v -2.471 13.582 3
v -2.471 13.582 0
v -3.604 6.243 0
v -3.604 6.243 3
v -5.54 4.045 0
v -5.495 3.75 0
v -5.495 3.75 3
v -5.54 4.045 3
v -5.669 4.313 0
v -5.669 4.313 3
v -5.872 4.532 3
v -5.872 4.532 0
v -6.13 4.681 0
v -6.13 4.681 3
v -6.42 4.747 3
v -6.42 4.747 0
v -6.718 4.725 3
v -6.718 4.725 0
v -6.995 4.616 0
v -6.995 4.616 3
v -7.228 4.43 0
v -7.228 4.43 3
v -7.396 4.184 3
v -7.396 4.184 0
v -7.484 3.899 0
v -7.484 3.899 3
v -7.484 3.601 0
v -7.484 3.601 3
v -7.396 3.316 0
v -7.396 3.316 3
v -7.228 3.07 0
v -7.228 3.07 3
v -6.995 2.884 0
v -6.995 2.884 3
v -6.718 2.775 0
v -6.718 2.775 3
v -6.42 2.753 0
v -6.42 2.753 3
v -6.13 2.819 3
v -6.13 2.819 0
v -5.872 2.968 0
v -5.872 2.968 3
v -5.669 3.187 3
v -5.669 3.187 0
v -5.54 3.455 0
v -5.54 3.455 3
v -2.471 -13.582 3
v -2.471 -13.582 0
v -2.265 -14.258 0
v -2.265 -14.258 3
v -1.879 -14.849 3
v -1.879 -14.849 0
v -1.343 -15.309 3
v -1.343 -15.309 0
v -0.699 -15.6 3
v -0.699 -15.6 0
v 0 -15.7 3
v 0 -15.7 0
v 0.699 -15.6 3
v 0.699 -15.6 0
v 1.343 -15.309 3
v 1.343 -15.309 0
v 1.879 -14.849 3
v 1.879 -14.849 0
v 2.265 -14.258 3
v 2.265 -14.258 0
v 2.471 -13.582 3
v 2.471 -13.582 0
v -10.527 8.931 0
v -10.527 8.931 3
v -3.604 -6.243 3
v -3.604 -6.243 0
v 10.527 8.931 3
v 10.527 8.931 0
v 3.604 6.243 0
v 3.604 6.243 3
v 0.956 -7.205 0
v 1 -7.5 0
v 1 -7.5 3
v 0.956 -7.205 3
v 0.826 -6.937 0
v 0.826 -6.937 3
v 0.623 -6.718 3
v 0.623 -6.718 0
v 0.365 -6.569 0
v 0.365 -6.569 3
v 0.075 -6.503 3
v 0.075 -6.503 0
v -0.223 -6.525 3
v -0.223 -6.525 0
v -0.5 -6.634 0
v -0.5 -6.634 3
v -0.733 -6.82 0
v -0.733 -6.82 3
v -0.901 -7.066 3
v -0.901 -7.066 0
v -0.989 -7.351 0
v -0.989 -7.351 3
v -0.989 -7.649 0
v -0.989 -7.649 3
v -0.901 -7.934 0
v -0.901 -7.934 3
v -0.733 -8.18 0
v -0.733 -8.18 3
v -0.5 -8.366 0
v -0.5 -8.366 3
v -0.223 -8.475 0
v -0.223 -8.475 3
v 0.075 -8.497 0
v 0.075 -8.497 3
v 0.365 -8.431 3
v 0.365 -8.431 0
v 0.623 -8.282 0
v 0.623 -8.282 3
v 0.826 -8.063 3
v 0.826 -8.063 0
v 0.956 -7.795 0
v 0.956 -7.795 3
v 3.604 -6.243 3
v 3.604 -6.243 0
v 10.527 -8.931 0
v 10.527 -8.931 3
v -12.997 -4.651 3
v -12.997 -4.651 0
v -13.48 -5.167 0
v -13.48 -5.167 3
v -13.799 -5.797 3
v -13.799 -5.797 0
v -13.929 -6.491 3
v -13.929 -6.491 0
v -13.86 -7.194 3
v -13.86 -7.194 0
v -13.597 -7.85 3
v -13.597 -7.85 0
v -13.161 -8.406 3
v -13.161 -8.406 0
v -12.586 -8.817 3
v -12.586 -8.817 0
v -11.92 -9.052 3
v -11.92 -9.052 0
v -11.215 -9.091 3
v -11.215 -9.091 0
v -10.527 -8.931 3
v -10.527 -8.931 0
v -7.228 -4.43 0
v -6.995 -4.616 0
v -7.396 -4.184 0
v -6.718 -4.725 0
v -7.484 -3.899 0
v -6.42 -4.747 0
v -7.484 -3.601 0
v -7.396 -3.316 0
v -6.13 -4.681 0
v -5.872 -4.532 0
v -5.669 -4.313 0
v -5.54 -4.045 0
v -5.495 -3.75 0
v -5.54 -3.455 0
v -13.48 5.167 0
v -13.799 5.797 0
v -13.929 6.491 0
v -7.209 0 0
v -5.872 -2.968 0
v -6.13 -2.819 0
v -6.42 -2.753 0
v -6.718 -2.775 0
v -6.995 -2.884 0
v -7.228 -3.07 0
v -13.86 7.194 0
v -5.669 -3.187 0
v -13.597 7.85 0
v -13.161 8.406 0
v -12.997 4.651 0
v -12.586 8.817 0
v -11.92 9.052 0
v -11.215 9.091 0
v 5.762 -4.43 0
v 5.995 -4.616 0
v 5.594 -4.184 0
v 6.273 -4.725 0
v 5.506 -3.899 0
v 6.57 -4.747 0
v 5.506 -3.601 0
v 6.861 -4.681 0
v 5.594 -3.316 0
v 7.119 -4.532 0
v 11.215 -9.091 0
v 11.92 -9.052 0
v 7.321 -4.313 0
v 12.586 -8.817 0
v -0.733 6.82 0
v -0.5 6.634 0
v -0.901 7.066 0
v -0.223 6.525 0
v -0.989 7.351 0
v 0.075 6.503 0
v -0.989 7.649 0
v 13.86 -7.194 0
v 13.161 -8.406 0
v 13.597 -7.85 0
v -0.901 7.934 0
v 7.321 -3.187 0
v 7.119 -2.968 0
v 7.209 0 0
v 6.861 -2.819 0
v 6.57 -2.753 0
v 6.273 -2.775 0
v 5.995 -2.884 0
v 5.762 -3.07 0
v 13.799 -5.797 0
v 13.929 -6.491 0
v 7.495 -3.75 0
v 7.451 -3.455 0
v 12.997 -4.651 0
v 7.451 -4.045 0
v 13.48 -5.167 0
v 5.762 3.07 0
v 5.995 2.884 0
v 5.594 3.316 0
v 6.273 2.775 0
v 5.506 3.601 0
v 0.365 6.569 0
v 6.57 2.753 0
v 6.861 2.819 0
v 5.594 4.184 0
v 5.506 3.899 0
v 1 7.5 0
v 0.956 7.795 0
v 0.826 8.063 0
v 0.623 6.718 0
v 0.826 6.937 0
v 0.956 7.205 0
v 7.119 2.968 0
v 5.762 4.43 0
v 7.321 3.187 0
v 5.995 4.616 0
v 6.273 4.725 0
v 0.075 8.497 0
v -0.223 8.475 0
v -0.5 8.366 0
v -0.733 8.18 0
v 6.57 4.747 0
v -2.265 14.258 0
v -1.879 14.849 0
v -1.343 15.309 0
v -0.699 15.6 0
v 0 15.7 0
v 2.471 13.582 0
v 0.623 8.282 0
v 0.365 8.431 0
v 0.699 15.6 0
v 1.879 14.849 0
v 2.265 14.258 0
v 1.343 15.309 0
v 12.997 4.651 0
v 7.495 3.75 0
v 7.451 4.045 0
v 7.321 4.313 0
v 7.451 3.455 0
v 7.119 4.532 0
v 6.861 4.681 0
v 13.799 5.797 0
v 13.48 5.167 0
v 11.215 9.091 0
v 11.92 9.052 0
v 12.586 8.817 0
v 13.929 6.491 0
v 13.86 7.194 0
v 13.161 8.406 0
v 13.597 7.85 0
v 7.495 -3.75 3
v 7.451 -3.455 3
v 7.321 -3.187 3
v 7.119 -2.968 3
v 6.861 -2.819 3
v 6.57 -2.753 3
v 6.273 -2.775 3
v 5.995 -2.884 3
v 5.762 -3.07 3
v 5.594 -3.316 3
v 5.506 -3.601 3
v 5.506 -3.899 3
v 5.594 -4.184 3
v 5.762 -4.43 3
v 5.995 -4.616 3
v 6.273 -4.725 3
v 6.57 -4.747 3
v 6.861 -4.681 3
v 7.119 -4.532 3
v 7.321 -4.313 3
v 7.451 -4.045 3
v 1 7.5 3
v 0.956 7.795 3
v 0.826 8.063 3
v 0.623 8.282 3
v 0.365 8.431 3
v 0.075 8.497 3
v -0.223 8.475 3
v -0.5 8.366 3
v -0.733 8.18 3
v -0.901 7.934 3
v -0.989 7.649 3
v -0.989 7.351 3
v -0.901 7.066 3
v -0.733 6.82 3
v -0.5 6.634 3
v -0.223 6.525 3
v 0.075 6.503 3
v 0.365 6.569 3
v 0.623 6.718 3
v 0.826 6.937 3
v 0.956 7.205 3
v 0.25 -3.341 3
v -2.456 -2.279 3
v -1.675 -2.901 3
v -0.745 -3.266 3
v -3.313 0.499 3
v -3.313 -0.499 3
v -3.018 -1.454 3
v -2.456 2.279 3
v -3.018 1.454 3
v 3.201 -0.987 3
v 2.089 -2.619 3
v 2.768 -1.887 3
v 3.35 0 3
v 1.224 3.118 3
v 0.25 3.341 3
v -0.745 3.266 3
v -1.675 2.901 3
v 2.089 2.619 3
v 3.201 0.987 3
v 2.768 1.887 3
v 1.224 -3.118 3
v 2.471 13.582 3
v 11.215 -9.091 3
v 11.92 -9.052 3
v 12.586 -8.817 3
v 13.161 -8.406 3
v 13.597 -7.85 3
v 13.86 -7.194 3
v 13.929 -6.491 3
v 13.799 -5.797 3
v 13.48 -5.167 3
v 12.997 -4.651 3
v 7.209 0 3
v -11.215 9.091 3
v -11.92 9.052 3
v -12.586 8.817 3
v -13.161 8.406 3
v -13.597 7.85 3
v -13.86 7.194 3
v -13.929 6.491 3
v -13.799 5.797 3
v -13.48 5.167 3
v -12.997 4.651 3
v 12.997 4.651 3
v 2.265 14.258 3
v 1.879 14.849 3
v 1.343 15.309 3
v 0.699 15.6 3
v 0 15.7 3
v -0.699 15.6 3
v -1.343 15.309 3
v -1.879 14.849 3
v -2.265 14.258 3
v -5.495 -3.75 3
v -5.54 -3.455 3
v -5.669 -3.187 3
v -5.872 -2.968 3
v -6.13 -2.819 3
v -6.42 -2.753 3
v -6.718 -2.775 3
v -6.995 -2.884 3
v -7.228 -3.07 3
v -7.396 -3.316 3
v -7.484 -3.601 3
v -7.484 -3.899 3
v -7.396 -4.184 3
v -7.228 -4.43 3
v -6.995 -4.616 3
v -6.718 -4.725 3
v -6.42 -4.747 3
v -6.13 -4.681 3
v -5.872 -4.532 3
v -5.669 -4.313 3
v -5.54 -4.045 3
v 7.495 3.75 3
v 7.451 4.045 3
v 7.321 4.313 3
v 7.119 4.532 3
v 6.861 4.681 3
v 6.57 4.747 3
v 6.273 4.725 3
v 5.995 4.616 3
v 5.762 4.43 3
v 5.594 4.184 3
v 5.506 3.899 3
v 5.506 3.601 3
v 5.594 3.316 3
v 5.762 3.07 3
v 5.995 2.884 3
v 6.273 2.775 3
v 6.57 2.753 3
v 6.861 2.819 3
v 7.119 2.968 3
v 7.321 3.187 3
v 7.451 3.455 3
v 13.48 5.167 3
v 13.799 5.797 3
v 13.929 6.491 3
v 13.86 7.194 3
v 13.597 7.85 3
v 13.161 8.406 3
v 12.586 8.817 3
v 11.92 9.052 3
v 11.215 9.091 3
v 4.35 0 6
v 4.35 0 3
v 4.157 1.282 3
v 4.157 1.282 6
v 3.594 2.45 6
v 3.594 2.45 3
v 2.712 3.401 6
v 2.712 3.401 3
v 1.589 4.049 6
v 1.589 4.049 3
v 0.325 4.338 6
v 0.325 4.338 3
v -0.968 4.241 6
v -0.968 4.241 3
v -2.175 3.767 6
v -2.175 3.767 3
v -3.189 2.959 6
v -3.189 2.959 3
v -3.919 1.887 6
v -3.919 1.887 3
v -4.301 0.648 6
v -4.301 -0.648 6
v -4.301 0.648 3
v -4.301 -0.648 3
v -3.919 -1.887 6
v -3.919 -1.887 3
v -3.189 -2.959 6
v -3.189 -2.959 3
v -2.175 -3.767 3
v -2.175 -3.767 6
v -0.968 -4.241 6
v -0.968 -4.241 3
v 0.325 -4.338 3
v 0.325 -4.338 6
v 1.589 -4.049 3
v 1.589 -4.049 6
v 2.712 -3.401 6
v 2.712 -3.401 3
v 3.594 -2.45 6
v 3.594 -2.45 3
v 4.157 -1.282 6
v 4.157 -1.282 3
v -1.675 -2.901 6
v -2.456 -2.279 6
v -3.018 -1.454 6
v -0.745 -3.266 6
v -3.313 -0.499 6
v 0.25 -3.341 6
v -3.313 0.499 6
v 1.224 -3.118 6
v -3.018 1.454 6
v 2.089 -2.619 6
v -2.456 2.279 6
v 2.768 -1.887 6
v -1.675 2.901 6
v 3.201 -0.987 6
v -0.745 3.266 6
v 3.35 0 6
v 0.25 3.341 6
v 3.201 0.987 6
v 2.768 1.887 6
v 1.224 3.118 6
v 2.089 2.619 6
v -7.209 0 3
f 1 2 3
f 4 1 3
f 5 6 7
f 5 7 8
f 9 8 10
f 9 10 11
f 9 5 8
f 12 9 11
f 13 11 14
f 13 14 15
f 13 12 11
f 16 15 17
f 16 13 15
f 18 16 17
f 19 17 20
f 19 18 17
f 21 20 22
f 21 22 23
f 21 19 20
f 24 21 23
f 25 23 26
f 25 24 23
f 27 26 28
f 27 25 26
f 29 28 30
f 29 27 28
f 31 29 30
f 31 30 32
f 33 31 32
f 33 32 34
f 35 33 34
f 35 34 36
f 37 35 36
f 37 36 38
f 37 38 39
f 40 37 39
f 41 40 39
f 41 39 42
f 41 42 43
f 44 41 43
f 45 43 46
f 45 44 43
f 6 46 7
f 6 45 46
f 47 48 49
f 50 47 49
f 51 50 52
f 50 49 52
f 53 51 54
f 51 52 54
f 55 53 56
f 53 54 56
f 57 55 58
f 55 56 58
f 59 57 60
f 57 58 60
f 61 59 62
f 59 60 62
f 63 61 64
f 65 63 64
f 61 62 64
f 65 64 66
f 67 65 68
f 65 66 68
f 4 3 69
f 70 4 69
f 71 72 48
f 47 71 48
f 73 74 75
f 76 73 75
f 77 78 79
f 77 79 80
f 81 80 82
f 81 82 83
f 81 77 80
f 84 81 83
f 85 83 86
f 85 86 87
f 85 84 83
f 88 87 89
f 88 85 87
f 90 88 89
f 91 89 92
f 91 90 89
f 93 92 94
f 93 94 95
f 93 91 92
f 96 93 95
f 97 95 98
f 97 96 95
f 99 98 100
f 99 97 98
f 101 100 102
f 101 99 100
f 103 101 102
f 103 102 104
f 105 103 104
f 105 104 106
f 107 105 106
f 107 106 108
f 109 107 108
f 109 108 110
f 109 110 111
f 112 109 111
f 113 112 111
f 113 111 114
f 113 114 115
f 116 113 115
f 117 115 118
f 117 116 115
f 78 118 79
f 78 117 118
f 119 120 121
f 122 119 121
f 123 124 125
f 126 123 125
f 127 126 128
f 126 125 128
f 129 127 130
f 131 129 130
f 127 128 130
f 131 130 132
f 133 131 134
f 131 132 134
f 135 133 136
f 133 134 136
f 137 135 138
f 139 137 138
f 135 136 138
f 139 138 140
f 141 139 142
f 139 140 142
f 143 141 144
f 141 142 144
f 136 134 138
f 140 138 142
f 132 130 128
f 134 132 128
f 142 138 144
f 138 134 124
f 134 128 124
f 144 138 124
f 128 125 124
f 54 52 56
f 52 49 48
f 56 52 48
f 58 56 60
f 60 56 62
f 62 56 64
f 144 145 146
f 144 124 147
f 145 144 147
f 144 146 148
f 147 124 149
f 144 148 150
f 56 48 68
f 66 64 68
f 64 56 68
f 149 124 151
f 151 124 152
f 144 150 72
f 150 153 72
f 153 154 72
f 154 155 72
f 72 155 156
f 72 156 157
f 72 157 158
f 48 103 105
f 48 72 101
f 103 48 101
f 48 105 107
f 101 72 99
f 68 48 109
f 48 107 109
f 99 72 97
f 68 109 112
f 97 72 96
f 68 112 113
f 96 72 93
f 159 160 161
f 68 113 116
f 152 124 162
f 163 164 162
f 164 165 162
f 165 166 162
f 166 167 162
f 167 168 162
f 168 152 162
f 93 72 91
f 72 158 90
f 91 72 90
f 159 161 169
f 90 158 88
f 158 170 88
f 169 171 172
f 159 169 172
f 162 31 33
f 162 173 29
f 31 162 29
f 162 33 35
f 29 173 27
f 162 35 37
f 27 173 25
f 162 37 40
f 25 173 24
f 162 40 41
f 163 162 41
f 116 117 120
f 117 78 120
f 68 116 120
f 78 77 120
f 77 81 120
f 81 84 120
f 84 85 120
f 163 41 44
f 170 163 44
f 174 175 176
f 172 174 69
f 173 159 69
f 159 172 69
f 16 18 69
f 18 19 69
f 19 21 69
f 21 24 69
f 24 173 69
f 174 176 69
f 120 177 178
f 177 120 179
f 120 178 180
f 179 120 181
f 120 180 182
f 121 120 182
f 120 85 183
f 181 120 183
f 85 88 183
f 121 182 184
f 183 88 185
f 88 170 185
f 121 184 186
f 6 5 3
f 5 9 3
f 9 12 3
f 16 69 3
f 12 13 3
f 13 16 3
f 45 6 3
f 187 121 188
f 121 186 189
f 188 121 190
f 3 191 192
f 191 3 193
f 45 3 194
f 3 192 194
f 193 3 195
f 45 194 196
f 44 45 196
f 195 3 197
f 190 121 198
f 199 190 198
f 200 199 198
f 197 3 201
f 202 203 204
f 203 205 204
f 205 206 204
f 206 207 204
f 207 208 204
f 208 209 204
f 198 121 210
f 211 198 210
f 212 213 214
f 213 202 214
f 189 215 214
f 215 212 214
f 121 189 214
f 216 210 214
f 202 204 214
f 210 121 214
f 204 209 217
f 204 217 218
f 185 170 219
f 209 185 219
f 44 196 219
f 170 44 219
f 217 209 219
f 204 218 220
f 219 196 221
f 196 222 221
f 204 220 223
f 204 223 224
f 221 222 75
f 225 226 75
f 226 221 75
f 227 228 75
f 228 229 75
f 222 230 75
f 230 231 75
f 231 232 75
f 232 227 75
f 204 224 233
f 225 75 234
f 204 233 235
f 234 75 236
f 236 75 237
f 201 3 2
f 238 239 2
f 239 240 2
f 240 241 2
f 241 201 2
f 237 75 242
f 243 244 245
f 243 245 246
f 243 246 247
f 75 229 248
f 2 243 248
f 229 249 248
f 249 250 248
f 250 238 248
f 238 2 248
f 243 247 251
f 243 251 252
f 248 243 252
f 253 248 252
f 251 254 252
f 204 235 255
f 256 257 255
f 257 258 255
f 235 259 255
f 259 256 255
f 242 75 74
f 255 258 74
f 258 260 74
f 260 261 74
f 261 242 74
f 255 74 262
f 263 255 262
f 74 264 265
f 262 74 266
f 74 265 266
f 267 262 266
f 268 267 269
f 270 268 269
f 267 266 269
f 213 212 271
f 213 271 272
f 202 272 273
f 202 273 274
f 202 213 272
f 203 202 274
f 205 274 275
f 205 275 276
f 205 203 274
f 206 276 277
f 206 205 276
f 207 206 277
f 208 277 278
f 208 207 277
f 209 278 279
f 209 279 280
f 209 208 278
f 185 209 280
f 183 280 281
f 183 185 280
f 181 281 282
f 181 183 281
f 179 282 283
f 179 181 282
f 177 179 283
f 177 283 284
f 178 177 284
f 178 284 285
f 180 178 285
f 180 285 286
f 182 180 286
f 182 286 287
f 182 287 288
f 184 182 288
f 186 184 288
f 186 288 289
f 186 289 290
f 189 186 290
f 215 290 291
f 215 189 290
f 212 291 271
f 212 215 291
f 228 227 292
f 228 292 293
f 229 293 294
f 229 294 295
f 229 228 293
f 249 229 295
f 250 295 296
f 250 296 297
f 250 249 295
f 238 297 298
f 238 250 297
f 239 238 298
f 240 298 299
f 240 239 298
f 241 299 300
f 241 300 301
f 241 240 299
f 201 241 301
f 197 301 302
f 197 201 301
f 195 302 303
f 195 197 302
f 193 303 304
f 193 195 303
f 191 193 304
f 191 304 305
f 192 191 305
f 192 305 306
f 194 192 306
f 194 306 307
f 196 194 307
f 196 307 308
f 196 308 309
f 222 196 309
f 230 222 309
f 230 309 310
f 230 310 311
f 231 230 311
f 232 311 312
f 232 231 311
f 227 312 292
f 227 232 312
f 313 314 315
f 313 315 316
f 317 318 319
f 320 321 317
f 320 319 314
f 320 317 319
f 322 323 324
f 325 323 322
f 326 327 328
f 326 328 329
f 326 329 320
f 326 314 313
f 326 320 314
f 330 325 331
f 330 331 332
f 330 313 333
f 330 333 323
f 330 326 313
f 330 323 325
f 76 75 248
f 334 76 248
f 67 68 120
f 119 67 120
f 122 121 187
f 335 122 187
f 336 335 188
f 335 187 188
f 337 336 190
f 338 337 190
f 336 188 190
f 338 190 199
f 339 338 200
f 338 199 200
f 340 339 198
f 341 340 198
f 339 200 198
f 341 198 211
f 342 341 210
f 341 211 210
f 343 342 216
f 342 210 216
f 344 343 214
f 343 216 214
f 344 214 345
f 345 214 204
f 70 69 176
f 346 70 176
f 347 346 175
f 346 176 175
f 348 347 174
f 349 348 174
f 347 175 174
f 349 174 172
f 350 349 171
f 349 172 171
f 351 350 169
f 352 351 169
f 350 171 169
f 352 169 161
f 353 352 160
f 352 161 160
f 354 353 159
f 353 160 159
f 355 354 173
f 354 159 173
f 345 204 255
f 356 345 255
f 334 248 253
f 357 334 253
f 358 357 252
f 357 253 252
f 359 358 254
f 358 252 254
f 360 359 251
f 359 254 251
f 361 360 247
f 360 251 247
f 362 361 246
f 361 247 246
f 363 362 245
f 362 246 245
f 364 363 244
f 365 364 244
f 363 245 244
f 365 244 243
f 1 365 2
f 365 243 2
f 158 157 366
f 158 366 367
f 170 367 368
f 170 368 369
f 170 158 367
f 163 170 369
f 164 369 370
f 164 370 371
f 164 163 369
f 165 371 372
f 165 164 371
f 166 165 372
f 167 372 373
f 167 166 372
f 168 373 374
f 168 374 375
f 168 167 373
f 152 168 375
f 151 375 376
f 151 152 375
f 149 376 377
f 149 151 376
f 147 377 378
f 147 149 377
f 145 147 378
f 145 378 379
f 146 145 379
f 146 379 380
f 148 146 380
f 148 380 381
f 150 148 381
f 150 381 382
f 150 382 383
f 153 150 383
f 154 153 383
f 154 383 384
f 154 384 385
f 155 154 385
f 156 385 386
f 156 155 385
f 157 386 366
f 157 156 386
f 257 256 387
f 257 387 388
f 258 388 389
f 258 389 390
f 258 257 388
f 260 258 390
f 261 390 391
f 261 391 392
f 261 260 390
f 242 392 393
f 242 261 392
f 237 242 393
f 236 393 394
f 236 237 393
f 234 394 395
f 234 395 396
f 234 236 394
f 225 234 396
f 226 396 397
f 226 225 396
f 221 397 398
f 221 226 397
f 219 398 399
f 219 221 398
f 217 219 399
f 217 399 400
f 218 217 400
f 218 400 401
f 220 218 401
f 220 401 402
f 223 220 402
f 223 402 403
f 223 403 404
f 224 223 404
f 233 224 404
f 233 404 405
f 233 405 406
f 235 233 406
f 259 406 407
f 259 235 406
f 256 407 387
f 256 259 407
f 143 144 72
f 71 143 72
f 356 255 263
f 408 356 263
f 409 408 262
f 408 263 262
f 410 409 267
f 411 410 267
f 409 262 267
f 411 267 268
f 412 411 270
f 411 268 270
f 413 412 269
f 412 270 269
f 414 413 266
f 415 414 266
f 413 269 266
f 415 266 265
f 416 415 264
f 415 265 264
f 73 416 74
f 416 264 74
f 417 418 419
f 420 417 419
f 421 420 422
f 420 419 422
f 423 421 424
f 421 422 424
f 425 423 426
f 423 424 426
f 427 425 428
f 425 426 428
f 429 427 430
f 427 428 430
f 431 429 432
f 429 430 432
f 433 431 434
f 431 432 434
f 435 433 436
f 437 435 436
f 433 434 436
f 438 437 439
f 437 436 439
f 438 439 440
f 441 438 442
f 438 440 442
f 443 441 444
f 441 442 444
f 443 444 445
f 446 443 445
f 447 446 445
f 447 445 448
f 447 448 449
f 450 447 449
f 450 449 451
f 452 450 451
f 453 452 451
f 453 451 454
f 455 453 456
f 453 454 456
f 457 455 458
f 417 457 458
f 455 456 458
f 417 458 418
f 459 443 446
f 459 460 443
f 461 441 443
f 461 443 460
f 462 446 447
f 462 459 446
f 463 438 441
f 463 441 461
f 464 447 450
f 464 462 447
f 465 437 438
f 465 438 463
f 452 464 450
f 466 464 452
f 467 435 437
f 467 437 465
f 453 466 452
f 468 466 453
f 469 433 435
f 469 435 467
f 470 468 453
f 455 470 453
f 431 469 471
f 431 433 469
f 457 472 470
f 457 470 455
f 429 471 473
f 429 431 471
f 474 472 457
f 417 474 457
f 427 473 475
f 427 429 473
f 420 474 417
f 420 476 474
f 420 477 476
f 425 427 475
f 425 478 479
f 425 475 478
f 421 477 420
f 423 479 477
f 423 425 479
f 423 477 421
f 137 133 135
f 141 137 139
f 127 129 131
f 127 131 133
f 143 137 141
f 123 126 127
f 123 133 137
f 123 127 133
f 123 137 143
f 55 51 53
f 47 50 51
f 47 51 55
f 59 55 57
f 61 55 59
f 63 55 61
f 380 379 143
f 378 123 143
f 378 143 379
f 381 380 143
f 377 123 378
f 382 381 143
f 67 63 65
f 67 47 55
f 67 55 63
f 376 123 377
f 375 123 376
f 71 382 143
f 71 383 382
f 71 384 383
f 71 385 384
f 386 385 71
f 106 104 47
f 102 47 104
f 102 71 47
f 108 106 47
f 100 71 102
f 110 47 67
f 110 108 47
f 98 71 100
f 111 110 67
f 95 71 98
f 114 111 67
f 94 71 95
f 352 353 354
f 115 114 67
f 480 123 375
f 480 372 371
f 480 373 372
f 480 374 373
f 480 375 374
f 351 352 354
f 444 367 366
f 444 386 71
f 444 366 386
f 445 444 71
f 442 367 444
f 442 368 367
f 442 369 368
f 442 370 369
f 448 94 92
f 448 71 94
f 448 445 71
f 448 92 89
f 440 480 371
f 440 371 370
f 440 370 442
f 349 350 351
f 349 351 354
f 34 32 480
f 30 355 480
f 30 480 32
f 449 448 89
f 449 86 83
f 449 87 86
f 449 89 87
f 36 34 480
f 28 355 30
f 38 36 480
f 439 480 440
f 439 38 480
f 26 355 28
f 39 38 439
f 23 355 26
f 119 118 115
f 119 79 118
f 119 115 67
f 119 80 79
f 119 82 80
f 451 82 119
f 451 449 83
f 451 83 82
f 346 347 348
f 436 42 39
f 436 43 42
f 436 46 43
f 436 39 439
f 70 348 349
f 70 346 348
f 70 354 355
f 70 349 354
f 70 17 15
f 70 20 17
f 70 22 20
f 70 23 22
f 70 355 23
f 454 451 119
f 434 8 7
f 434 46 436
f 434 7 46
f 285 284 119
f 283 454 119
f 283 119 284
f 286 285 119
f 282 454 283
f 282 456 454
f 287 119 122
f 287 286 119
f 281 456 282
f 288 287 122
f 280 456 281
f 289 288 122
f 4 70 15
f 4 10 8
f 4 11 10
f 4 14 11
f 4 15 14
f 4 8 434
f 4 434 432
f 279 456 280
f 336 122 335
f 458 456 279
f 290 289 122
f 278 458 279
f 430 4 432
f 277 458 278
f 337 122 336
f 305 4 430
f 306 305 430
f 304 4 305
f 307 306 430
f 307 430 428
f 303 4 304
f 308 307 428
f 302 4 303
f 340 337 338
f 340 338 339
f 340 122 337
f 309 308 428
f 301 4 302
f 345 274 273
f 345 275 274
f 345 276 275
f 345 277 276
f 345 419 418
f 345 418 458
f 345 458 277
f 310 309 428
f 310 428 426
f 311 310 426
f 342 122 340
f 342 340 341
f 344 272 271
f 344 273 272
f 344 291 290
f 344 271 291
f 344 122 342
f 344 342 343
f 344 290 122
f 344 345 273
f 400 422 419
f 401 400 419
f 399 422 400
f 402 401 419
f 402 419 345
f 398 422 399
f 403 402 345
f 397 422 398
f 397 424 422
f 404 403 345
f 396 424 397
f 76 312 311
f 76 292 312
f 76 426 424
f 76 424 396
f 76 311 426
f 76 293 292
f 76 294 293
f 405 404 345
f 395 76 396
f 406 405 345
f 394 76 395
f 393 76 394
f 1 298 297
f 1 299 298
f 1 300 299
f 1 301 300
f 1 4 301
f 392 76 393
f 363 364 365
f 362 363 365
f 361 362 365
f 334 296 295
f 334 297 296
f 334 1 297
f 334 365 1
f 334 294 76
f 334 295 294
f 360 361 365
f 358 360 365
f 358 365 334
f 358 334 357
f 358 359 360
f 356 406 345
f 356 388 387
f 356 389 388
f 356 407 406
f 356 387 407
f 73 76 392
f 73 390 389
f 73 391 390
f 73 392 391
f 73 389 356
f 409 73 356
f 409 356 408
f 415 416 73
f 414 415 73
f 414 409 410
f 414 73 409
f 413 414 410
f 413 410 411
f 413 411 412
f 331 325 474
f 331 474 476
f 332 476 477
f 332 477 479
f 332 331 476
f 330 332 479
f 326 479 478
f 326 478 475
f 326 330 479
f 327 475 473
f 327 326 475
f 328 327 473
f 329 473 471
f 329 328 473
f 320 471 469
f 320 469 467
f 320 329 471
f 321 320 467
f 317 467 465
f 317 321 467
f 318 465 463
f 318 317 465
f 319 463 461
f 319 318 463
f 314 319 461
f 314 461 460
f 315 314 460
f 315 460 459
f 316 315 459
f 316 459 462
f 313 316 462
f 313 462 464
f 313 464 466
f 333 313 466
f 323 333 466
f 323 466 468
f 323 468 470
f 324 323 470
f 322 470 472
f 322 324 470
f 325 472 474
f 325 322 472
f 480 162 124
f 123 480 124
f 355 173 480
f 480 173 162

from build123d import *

# Parameters (mm, degrees)
SKETCH_1_R        = 1
EXTRUDE_1_DEPTH   = 3
SKETCH_2_R        = 4.35
SKETCH_2_R_2      = 3.35
EXTRUDE_1_2_DEPTH = 3


with BuildPart() as part:
    # 草图1 → Extrude 1 (new body)
    with BuildSketch(Plane.XY):
        with BuildLine():
            Line((-2.470698832, 13.581637634), (-3.604292918, 6.242818459))
            Line((-3.604292918, 6.242818459), (-10.5266938, 8.93050677))
            ThreePointArc((-10.5266938, 8.93050677), (-13.596598839, 7.85), (-12.997392632, 4.651130864))
            Line((-12.997392632, 4.651130864), (-7.208585836, 0))
            Line((-7.208585836, 0), (-12.997392632, -4.651130864))
            ThreePointArc((-12.997392632, -4.651130864), (-13.596598839, -7.85), (-10.5266938, -8.93050677))
            Line((-10.5266938, -8.93050677), (-3.604292918, -6.242818459))
            Line((-3.604292918, -6.242818459), (-2.470698832, -13.581637634))
            ThreePointArc((-2.470698832, -13.581637634), (0, -15.7), (2.470698832, -13.581637634))
            Line((2.470698832, -13.581637634), (3.604292918, -6.242818459))
            Line((3.604292918, -6.242818459), (10.5266938, -8.93050677))
            ThreePointArc((10.5266938, -8.93050677), (13.596598839, -7.85), (12.997392632, -4.651130864))
            Line((12.997392632, -4.651130864), (7.208585836, 0))
            Line((7.208585836, 0), (12.997392632, 4.651130864))
            ThreePointArc((12.997392632, 4.651130864), (13.596598839, 7.85), (10.5266938, 8.93050677))
            Line((10.5266938, 8.93050677), (3.604292918, 6.242818459))
            Line((3.604292918, 6.242818459), (2.470698832, 13.581637634))
            ThreePointArc((2.470698832, 13.581637634), (0, 15.7), (-2.470698832, 13.581637634))
        make_face()
        with Locations((6.495190528, 3.75)):
            Circle(SKETCH_1_R, mode=Mode.SUBTRACT)
        with Locations((0, 7.5)):
            Circle(SKETCH_1_R, mode=Mode.SUBTRACT)
        with Locations((6.495190528, -3.75)):
            Circle(SKETCH_1_R, mode=Mode.SUBTRACT)
        with Locations((0, -7.5)):
            Circle(SKETCH_1_R, mode=Mode.SUBTRACT)
        with Locations((-6.495190528, -3.75)):
            Circle(SKETCH_1_R, mode=Mode.SUBTRACT)
        with Locations((-6.495190528, 3.75)):
            Circle(SKETCH_1_R, mode=Mode.SUBTRACT)
    extrude(amount=EXTRUDE_1_DEPTH)

    # 草图2 → Extrude 1 2 (add)
    with BuildSketch(Plane.XY.offset(3)):
        Circle(SKETCH_2_R)
        Circle(SKETCH_2_R_2, mode=Mode.SUBTRACT)
    extrude(amount=EXTRUDE_1_2_DEPTH)


solid = part.part
